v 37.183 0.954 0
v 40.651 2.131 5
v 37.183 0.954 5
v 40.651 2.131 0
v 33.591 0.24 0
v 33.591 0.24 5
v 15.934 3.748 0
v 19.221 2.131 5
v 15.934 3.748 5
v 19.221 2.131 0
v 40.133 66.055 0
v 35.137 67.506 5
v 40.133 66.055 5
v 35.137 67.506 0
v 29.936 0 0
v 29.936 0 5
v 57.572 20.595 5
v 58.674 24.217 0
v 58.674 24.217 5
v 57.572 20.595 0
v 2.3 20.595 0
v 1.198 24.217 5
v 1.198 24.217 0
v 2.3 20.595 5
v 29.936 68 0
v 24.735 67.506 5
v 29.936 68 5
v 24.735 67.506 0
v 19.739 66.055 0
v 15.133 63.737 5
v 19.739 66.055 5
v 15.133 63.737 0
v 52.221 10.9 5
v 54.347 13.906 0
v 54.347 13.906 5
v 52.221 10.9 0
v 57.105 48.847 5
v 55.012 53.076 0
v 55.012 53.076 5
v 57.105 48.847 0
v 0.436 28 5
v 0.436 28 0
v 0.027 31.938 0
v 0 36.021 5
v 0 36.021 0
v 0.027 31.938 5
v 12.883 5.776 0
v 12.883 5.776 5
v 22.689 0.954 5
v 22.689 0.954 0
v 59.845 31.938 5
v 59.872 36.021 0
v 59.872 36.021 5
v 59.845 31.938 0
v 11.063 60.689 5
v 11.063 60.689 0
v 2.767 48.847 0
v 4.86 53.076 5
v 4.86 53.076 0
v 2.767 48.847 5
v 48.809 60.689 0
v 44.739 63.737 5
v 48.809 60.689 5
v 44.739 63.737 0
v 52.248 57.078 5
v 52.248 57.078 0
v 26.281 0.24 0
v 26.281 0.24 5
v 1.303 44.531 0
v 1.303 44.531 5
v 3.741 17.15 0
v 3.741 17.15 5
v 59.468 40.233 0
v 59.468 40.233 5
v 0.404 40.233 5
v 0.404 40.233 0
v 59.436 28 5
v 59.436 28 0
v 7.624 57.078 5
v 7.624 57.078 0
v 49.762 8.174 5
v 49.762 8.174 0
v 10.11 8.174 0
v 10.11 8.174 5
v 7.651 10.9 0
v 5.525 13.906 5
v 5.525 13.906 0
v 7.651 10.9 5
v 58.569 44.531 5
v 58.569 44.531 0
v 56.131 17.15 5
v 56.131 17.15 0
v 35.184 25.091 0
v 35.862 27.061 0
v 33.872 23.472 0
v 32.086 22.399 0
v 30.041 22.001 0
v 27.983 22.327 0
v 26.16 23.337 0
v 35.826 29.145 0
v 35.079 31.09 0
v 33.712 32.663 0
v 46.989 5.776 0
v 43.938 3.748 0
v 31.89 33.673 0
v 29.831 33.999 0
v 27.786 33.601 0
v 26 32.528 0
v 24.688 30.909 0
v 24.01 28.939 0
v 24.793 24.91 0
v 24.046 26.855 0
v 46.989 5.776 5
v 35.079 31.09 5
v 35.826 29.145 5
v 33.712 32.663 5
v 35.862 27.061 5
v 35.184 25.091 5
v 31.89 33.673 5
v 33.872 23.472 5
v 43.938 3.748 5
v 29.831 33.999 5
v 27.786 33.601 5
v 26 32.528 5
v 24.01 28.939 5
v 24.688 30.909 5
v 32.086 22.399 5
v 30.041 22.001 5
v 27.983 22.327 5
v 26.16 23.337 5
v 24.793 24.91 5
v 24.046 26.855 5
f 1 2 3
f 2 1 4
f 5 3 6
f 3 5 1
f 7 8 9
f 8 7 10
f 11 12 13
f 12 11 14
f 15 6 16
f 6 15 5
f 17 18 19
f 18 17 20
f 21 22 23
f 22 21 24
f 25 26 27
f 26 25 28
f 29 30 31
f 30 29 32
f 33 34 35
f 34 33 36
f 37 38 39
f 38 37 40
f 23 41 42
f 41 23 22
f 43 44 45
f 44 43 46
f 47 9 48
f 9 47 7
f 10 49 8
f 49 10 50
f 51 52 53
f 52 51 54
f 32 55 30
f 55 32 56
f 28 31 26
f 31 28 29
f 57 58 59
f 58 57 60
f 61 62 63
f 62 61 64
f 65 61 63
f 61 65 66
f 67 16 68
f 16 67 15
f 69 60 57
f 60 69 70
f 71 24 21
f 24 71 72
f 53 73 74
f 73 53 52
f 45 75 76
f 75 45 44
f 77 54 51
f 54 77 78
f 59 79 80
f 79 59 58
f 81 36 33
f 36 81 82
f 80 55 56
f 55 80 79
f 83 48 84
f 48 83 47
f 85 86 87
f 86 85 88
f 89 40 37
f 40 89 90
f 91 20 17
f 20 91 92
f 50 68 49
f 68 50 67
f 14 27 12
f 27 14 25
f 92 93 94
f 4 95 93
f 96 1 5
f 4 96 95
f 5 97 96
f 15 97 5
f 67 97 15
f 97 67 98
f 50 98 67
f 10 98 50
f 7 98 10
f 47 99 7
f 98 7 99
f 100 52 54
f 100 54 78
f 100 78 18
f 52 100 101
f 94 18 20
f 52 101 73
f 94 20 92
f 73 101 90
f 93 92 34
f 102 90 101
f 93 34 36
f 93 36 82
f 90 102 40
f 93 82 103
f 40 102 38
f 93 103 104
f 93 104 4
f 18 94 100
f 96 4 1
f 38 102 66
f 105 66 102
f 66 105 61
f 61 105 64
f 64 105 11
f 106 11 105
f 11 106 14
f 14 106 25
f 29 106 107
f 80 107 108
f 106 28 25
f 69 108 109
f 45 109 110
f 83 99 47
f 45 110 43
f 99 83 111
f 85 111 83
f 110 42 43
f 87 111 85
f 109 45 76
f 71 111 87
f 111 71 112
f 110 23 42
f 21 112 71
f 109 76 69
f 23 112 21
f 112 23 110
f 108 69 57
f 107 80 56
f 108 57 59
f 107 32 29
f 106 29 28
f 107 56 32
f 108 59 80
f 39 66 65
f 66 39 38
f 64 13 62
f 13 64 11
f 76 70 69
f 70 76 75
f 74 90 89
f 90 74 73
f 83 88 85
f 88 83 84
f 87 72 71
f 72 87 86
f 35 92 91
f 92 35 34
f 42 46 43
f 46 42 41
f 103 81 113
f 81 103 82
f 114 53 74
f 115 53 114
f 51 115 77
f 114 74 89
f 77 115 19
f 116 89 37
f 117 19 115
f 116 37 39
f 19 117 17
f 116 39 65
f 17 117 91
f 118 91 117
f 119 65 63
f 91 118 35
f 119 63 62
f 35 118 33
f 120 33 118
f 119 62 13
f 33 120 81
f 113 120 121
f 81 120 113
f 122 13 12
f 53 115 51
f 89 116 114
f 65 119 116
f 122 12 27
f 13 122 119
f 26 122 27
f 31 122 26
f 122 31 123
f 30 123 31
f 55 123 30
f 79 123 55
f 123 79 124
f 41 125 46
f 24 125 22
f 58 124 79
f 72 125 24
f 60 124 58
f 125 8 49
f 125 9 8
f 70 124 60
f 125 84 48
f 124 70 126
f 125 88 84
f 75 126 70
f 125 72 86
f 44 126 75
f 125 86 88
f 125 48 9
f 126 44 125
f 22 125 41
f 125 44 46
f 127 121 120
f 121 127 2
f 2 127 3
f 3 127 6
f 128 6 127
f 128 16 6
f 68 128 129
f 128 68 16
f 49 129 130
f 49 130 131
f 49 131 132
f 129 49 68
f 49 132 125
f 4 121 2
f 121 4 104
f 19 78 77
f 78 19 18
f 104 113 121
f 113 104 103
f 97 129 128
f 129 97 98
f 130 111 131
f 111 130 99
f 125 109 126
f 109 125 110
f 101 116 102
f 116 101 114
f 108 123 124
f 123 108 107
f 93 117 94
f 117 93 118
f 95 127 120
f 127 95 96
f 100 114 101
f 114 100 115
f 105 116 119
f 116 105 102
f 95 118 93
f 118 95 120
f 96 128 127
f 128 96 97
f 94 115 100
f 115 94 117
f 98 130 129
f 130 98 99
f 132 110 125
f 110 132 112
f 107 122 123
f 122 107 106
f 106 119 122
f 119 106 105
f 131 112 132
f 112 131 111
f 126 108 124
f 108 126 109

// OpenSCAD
$fn = 32;

// ----------------------------------------------------------------------
// Cam plate: single_lobe cam, base R28
// ----------------------------------------------------------------------

// --- parameters (mm) ---
base_r = 28;              // base circle radius
lobe_h = 12;              // cam lobe rise
bore_r = 6;               // shaft bore radius
plate_t = 5;              // plate thickness, Z (extrusion height)

profile = [[59.436, 28], [59.845, 31.938], [59.872, 36.021], [59.468, 40.233], [58.569, 44.531], [57.105, 48.847], [55.012, 53.076], [52.248, 57.078], [48.809, 60.689], [44.739, 63.737], [40.133, 66.055], [35.137, 67.506], [29.936, 68], [24.735, 67.506], [19.739, 66.055], [15.133, 63.737], [11.063, 60.689], [7.624, 57.078], [4.86, 53.076], [2.767, 48.847], [1.303, 44.531], [0.404, 40.233], [0, 36.021], [0.027, 31.938], [0.436, 28], [1.198, 24.217], [2.3, 20.595], [3.741, 17.15], [5.525, 13.906], [7.651, 10.9], [10.11, 8.174], [12.883, 5.776], [15.934, 3.748], [19.221, 2.131], [22.689, 0.954], [26.281, 0.24], [29.936, 0], [33.591, 0.24], [37.183, 0.954], [40.651, 2.131], [43.938, 3.748], [46.989, 5.776], [49.762, 8.174], [52.221, 10.9], [54.347, 13.906], [56.131, 17.15], [57.572, 20.595], [58.674, 24.217]];  // primary outline, 48 points, counter clockwise
void_1 = [[35.826, 29.145], [35.079, 31.09], [33.712, 32.663], [31.89, 33.673], [29.831, 33.999], [27.786, 33.601], [26, 32.528], [24.688, 30.909], [24.01, 28.939], [24.046, 26.855], [24.793, 24.91], [26.16, 23.337], [27.983, 22.327], [30.041, 22.001], [32.086, 22.399], [33.872, 23.472], [35.184, 25.091], [35.862, 27.061]];  // shaft bore, 18 points

// --- the one profile operation ---
difference() {
  linear_extrude(height = plate_t) polygon(points = profile);
  translate([0, 0, -1])
    linear_extrude(height = plate_t + 2) polygon(points = void_1);
}
